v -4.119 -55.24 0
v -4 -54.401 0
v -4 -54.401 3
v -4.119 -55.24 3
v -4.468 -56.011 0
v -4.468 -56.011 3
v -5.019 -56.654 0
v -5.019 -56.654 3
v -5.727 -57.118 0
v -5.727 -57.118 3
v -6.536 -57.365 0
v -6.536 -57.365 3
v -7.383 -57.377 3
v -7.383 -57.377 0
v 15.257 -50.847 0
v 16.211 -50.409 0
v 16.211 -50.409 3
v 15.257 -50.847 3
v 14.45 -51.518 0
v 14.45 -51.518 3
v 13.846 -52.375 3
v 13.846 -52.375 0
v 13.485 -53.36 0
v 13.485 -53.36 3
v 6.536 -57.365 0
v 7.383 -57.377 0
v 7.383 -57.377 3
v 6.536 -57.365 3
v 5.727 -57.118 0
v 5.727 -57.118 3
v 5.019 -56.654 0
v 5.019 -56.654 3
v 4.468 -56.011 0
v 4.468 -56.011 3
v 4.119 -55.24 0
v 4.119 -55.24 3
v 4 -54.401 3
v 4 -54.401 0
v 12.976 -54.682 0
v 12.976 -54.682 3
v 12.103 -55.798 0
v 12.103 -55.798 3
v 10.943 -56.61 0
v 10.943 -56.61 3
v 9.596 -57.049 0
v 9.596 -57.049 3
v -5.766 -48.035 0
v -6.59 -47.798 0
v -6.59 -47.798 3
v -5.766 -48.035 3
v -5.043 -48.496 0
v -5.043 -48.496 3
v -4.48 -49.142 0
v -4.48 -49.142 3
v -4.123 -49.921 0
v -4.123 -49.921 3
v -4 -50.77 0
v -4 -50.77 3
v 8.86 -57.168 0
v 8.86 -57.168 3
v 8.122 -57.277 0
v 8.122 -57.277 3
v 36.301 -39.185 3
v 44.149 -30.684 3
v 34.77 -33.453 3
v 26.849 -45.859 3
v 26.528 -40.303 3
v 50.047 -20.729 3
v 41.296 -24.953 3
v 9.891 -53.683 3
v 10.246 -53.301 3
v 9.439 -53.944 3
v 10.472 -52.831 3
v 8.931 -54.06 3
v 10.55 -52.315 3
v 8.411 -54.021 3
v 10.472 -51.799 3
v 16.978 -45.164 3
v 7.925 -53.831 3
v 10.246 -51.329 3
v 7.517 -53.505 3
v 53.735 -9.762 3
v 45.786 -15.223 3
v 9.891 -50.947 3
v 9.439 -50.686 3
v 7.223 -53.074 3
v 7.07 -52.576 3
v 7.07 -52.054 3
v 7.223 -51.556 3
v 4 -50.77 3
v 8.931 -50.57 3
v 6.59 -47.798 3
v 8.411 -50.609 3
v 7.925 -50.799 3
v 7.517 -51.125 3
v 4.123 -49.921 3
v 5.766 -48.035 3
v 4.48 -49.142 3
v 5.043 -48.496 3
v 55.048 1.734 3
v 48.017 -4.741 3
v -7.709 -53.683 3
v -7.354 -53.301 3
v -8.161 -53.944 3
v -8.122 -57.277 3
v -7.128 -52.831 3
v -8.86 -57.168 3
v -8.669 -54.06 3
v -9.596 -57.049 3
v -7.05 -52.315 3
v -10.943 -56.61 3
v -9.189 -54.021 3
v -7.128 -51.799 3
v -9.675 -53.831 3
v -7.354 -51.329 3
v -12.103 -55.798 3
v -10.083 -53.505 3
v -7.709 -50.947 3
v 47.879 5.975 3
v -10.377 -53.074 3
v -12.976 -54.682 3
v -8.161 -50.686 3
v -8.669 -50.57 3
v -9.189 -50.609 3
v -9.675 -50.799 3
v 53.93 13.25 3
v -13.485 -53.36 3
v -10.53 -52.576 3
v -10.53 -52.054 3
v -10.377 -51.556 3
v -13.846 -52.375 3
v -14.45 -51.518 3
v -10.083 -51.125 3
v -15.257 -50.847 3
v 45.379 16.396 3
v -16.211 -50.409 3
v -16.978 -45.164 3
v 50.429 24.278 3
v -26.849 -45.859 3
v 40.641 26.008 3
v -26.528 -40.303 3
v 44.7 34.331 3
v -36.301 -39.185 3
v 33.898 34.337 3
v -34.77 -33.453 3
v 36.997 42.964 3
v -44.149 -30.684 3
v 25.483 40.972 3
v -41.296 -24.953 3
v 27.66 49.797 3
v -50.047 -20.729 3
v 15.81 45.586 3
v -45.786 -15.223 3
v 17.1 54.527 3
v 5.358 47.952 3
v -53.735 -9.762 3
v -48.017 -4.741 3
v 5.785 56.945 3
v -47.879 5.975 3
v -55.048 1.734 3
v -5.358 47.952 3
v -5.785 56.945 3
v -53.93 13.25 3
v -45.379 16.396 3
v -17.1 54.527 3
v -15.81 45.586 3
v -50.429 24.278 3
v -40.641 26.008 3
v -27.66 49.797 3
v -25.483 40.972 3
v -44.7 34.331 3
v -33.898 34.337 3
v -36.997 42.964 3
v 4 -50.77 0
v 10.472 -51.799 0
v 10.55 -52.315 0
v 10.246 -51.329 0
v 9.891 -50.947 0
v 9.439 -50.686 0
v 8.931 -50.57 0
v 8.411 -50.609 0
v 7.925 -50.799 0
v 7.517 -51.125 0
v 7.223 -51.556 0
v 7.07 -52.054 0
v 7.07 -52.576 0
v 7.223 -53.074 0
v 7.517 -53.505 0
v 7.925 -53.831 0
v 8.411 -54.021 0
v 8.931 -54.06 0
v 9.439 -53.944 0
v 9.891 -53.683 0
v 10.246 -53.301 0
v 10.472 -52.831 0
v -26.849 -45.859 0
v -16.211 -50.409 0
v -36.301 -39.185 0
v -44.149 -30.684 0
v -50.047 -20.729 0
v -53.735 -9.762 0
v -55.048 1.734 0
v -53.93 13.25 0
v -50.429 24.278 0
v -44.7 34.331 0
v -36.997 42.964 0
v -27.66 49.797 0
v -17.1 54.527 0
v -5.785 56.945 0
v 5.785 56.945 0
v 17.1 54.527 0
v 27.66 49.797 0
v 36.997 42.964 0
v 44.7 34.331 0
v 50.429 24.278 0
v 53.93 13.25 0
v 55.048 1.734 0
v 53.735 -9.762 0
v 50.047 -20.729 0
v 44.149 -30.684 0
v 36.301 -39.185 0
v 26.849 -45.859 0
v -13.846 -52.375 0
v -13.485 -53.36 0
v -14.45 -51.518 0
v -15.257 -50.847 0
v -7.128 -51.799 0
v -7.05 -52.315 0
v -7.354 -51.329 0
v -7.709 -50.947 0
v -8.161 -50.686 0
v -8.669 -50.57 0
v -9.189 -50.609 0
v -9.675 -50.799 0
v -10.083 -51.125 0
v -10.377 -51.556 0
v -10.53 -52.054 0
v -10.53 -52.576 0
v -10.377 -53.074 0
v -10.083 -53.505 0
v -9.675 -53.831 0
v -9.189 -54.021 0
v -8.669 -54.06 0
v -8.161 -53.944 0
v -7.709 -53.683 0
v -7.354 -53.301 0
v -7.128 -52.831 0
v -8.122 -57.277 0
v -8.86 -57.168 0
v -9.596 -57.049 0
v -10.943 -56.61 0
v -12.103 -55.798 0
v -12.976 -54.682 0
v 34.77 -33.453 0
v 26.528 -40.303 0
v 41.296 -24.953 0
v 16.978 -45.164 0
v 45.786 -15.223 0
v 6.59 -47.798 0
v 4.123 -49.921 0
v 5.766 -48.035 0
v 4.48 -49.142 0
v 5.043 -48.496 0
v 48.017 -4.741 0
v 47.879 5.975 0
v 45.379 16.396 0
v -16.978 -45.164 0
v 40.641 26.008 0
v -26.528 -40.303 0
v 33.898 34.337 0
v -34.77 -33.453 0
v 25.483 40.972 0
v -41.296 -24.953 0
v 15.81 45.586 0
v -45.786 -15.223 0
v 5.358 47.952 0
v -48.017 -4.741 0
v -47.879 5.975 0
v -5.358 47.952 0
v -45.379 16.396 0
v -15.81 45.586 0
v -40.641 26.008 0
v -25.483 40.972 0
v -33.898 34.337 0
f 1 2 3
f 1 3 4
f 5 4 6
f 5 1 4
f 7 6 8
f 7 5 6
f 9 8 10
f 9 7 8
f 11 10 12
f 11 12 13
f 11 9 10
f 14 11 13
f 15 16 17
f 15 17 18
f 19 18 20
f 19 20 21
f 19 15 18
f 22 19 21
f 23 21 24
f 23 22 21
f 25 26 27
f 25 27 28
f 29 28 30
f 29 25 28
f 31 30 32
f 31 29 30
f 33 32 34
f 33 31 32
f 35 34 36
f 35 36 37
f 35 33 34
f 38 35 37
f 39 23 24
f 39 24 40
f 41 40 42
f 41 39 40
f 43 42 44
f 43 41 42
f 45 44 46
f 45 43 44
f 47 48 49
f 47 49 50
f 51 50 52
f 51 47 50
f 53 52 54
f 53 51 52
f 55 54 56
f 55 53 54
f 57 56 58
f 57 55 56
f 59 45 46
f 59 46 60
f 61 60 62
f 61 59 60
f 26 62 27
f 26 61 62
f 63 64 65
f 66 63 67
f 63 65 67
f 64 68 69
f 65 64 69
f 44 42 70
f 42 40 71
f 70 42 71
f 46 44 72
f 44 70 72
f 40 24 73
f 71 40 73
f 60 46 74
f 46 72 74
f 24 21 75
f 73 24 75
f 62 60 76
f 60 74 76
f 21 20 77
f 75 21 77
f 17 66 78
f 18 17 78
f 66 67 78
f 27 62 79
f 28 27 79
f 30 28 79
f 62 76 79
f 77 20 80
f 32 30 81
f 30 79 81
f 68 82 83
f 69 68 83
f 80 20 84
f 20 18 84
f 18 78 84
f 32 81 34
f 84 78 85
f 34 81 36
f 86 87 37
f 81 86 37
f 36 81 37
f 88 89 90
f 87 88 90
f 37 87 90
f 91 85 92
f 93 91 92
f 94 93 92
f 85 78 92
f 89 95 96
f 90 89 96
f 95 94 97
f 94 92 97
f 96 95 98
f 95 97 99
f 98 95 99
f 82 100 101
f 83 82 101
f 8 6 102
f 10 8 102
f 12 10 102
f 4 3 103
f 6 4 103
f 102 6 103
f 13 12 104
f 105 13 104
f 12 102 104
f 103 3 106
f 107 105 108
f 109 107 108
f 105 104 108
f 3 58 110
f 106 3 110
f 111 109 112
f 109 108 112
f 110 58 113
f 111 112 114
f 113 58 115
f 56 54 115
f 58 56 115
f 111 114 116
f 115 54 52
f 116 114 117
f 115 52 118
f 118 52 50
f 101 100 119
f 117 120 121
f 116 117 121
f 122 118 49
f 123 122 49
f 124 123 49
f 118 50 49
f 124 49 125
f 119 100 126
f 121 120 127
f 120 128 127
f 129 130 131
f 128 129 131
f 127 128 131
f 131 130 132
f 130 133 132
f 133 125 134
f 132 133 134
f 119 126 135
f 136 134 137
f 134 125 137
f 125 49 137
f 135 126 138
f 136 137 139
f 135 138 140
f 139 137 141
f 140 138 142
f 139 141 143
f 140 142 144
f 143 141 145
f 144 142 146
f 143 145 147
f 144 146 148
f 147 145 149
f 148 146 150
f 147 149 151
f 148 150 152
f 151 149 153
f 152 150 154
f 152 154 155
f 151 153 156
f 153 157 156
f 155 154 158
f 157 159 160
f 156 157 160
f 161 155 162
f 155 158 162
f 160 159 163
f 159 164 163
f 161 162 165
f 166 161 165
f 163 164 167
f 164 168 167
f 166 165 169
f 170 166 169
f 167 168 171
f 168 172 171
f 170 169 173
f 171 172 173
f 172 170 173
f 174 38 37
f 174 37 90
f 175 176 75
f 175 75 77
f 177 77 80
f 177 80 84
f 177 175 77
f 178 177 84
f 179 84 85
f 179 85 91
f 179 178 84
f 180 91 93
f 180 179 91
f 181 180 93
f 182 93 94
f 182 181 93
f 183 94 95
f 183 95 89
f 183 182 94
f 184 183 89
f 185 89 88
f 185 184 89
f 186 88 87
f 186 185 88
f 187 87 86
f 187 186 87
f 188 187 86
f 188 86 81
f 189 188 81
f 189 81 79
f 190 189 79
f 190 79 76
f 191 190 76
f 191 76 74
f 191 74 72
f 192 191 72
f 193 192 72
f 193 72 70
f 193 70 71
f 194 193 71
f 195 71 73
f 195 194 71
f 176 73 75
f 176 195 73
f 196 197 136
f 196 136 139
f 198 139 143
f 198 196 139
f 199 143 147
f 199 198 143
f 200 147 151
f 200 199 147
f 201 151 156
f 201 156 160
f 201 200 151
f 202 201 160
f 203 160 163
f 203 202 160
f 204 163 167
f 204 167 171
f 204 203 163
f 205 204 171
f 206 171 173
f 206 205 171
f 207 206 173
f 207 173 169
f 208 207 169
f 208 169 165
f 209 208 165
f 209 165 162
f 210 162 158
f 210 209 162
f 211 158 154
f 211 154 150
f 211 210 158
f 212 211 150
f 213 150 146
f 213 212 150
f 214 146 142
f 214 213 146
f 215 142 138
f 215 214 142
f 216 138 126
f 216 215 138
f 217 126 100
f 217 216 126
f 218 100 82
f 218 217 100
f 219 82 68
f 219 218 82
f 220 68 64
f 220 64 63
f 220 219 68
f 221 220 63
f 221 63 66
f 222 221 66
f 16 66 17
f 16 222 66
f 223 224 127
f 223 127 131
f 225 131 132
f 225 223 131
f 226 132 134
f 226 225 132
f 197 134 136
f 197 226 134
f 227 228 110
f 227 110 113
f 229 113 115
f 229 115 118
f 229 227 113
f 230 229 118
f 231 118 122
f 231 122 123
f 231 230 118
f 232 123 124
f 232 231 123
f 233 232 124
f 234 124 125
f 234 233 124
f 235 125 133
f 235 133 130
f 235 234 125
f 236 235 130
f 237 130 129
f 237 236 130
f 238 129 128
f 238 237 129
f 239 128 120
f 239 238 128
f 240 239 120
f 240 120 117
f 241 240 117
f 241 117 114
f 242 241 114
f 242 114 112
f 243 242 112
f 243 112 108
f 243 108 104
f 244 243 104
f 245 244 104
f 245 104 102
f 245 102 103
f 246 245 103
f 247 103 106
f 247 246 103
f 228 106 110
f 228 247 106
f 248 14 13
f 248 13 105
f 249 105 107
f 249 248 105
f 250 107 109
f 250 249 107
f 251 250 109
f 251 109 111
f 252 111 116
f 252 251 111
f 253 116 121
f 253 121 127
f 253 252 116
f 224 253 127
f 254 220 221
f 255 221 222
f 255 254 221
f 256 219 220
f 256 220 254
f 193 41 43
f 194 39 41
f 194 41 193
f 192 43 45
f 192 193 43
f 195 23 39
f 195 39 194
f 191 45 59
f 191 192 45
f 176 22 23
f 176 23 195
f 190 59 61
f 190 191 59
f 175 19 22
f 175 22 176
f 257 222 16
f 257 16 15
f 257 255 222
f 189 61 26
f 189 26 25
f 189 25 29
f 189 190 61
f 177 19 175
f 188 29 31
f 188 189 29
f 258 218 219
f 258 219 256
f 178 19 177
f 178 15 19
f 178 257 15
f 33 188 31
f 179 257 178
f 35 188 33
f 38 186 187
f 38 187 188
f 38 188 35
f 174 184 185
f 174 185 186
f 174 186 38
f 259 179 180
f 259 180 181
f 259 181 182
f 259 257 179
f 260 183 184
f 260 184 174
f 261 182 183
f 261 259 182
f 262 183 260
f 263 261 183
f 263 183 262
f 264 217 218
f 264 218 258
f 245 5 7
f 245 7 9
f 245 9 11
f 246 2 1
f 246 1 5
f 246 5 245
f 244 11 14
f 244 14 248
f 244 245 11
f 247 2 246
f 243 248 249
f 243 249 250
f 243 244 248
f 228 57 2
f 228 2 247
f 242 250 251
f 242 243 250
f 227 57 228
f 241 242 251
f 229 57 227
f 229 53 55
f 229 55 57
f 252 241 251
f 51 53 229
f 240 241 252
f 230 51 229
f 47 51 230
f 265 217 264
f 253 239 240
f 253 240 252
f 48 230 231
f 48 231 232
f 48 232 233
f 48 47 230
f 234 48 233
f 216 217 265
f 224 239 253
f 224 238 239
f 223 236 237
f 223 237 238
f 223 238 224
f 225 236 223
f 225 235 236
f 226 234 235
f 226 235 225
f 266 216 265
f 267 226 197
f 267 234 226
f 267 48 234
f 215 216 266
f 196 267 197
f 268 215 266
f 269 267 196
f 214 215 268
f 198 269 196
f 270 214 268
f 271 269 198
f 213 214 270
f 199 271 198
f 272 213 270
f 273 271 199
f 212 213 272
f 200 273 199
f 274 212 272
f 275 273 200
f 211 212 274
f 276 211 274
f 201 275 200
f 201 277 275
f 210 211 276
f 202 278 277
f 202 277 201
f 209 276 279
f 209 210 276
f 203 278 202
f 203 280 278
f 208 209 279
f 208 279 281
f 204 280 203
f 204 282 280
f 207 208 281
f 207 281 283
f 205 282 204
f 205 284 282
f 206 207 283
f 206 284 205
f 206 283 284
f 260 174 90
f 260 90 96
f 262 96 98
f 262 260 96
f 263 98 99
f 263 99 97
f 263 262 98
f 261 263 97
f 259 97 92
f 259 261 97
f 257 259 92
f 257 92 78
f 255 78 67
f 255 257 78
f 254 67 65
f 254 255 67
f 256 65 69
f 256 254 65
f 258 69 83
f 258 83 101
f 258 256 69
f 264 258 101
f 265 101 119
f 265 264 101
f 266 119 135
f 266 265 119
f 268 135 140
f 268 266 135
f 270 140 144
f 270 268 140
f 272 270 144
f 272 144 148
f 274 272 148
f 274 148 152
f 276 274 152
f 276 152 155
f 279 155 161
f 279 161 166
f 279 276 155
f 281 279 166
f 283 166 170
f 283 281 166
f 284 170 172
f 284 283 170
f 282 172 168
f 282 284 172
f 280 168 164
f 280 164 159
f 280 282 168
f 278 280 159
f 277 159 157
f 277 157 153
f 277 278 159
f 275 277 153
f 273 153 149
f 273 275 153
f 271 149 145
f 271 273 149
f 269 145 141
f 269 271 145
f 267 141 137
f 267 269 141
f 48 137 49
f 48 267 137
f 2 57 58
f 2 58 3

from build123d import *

# Parameters (mm, degrees)
SKETCH1_R      = 1.75
EXTRUDE1_DEPTH = 3


with BuildPart() as part:
    # Sketch1 → Extrude1 (new body)
    with BuildSketch(Plane.XY):
        with BuildLine():
            Line((-4, -50.76970061), (-4, -54.401493546))
            ThreePointArc((-4, -54.401493546), (-5.018660435, -56.654112805), (-7.382862352, -57.376962655))
            ThreePointArc((-7.382862352, -57.376962655), (-8.491134253, -57.223449207), (-9.596229972, -57.048530834))
            ThreePointArc((-9.596229972, -57.048530834), (-12.103146033, -55.797735176), (-13.484767706, -53.360474528))
            ThreePointArc((-13.484767706, -53.360474528), (-14.450357204, -51.517657712), (-16.210841333, -50.409040319))
            ThreePointArc((-16.210841333, -50.409040319), (0, 57.25), (16.210841333, -50.409040319))
            ThreePointArc((16.210841333, -50.409040319), (14.450357204, -51.517657712), (13.484767706, -53.360474528))
            ThreePointArc((13.484767706, -53.360474528), (12.103146033, -55.797735176), (9.596229972, -57.048530834))
            ThreePointArc((9.596229972, -57.048530834), (8.491134253, -57.223449207), (7.382862352, -57.376962655))
            ThreePointArc((7.382862352, -57.376962655), (5.018660435, -56.654112805), (4, -54.401493546))
            Line((4, -54.401493546), (4, -50.76970061))
            ThreePointArc((4, -50.76970061), (4.738444308, -48.79856747), (6.590243902, -47.797815696))
            ThreePointArc((6.590243902, -47.797815696), (0, 48.25), (-6.590243902, -47.797815696))
            ThreePointArc((-6.590243902, -47.797815696), (-4.738444308, -48.79856747), (-4, -50.76970061))
        make_face()
        with Locations((-8.8, -52.315031301)):
            Circle(SKETCH1_R, mode=Mode.SUBTRACT)
        with Locations((8.8, -52.315031301)):
            Circle(SKETCH1_R, mode=Mode.SUBTRACT)
    extrude(amount=EXTRUDE1_DEPTH)


solid = part.part
